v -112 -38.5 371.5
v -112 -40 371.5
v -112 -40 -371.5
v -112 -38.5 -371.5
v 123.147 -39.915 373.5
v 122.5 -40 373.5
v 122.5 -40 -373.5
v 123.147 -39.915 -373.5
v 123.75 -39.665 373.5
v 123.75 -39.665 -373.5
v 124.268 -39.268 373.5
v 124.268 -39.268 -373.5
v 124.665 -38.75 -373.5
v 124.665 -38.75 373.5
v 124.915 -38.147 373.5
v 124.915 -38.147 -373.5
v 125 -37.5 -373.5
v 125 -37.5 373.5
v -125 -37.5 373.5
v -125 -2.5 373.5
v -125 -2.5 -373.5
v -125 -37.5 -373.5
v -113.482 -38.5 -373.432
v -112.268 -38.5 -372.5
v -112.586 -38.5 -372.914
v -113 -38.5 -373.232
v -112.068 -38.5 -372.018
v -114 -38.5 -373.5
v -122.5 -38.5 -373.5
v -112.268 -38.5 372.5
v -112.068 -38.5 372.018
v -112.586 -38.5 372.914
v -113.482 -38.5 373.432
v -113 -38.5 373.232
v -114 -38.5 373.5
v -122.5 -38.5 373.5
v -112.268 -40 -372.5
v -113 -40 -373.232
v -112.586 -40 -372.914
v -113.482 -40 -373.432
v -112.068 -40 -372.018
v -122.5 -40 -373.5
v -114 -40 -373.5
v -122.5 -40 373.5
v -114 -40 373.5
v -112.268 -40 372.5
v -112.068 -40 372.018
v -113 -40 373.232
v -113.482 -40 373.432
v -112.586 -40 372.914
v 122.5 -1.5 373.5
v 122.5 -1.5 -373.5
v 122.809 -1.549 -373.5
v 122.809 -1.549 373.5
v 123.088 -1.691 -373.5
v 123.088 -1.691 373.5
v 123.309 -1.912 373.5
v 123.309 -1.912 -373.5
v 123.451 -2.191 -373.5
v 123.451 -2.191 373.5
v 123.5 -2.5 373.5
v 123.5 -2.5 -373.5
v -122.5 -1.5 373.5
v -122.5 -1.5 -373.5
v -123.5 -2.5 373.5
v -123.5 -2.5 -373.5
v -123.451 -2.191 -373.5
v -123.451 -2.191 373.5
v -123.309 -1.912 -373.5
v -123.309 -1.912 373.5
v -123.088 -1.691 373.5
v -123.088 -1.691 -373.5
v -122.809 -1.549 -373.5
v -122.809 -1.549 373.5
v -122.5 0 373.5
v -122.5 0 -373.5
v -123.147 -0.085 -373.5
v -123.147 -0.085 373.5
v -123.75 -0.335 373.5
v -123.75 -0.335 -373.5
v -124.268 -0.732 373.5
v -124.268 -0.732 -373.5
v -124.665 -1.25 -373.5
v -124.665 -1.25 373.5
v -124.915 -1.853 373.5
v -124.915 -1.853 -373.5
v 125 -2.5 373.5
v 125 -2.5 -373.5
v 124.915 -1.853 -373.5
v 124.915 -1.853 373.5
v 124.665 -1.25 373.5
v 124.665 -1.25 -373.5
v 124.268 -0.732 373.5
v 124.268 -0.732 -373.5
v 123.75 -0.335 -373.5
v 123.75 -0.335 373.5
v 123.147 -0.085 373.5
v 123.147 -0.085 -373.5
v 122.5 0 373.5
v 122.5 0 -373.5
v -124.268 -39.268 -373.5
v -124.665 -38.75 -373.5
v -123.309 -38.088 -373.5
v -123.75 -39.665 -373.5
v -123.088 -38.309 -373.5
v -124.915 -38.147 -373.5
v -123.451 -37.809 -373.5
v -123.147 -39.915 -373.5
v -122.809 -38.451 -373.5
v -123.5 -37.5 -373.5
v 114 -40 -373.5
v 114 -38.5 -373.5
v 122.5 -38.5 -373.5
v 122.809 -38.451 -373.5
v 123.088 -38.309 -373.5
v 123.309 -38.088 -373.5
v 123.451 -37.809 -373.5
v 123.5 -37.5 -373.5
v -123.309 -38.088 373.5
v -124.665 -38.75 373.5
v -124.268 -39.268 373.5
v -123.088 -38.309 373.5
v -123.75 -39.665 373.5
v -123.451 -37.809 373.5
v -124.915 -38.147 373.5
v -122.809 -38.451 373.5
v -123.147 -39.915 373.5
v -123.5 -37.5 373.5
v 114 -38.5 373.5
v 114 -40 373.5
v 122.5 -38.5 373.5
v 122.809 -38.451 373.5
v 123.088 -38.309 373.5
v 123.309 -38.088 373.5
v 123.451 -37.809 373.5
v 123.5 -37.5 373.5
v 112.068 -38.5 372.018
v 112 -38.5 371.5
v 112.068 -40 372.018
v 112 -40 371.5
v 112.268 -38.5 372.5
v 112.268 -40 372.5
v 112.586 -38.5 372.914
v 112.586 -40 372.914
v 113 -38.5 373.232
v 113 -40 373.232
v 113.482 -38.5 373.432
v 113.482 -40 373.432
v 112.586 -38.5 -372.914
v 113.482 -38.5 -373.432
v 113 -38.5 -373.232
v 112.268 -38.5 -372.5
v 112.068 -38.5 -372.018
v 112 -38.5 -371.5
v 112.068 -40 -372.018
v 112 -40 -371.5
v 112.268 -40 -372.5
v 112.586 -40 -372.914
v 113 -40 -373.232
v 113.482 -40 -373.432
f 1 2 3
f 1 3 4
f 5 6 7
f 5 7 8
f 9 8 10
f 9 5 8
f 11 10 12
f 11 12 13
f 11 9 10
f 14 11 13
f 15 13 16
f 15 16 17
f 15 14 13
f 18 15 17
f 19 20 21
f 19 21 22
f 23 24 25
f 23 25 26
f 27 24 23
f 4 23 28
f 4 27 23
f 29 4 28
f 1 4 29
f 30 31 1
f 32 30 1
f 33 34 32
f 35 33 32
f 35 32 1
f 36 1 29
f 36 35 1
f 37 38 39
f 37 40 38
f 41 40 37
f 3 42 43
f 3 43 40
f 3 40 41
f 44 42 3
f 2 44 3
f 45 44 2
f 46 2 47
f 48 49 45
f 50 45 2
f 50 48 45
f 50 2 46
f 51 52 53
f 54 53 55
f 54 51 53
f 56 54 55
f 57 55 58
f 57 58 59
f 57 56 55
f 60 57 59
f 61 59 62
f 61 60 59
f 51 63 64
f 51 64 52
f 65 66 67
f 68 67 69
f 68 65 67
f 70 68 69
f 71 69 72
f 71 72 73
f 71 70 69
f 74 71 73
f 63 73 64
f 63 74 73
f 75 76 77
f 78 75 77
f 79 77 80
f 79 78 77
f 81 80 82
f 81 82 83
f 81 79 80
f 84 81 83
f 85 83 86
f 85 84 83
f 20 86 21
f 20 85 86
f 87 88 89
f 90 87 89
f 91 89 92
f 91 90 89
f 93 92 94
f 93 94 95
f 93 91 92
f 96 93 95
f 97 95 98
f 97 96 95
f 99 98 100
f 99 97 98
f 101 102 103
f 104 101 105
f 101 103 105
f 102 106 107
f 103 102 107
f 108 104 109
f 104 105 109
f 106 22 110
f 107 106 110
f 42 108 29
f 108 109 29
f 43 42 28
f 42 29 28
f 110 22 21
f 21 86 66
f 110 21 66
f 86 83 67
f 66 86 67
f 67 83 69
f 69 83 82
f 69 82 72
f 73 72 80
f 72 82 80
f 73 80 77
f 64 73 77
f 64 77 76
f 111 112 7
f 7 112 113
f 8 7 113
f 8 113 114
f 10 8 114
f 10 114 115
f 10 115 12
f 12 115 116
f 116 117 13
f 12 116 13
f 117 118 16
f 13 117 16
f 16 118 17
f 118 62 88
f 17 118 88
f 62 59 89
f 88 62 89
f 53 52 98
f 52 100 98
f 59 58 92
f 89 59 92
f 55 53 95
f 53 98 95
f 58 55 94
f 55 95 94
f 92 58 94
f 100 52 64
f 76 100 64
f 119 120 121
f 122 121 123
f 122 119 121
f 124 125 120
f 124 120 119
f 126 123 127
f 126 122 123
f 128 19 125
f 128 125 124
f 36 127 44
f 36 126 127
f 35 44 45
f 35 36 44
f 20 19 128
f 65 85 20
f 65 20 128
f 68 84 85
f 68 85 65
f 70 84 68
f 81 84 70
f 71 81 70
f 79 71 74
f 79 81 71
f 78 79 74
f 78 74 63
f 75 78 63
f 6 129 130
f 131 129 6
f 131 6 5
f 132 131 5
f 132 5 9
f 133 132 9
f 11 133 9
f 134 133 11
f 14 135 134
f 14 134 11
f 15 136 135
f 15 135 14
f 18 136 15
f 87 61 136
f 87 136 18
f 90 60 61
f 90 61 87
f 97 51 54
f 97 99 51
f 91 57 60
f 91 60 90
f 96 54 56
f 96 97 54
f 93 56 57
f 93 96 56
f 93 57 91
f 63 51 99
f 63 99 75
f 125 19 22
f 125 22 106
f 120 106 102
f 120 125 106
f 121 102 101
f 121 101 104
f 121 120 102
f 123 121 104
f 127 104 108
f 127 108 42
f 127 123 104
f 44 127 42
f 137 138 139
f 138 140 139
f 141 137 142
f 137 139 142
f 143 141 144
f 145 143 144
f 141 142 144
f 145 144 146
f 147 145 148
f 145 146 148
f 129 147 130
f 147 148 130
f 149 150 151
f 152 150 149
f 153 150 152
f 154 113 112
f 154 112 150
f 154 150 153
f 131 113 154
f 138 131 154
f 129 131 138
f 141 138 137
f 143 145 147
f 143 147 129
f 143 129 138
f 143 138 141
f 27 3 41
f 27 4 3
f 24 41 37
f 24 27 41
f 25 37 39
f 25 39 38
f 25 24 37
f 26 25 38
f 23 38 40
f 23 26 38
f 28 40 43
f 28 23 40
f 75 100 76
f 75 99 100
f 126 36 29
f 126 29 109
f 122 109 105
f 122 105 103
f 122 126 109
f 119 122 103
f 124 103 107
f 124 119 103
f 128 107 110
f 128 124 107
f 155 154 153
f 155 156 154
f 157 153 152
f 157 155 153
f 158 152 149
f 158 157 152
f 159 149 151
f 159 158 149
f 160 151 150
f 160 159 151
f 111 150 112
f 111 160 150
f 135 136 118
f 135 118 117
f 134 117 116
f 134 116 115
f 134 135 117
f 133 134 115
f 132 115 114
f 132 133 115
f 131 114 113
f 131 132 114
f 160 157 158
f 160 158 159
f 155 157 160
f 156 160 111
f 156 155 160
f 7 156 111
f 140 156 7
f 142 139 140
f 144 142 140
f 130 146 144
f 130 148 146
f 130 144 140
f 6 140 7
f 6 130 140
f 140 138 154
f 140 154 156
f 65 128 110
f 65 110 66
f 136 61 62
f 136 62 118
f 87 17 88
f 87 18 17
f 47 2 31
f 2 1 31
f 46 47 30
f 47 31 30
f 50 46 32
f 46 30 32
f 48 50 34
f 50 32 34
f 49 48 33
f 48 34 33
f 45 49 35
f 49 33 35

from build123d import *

# Parameters (mm, degrees)
F1_DEPTH = 373.5
F2_R     = 2


with BuildPart() as f1:
    # F0 (on Top) → F1 (new body, symmetric)
    with BuildSketch(Plane.XY):
        with BuildLine():
            Line((122.5, 0), (0, 0))
            Line((0, 0), (-122.5, 0))
            ThreePointArc((-122.5, 0), (-124.267767, -0.732233), (-125, -2.5))
            Line((-125, -2.5), (-125, -37.5))
            ThreePointArc((-125, -37.5), (-124.267767, -39.267767), (-122.5, -40))
            Line((-122.5, -40), (-112, -40))
            Line((-112, -40), (-112, -38.5))
            Line((-112, -38.5), (-122.5, -38.5))
            ThreePointArc((-122.5, -38.5), (-123.207107, -38.207107), (-123.5, -37.5))
            Line((-123.5, -37.5), (-123.5, -2.5))
            ThreePointArc((-123.5, -2.5), (-123.207107, -1.792893), (-122.5, -1.5))
            Line((-122.5, -1.5), (0, -1.5))
            Line((0, -1.5), (122.5, -1.5))
            ThreePointArc((122.5, -1.5), (123.207107, -1.792893), (123.5, -2.5))
            Line((123.5, -2.5), (123.5, -37.5))
            ThreePointArc((123.5, -37.5), (123.207107, -38.207107), (122.5, -38.5))
            Line((122.5, -38.5), (112, -38.5))
            Line((112, -38.5), (112, -40))
            Line((112, -40), (122.5, -40))
            ThreePointArc((122.5, -40), (124.267767, -39.267767), (125, -37.5))
            Line((125, -37.5), (125, -2.5))
            ThreePointArc((125, -2.5), (124.267767, -0.732233), (122.5, 0))
        make_face()
    extrude(amount=F1_DEPTH, both=True)

    # F2
    f2_edges = [f1.edges().sort_by_distance(p)[0] for p in [
        (-112, -39.25, -373.5),
        (112, -39.25, -373.5),
        (112, -39.25, 373.5),
        (-112, -39.25, 373.5),
    ]]
    fillet(f2_edges, radius=F2_R)


solid = f1.part
